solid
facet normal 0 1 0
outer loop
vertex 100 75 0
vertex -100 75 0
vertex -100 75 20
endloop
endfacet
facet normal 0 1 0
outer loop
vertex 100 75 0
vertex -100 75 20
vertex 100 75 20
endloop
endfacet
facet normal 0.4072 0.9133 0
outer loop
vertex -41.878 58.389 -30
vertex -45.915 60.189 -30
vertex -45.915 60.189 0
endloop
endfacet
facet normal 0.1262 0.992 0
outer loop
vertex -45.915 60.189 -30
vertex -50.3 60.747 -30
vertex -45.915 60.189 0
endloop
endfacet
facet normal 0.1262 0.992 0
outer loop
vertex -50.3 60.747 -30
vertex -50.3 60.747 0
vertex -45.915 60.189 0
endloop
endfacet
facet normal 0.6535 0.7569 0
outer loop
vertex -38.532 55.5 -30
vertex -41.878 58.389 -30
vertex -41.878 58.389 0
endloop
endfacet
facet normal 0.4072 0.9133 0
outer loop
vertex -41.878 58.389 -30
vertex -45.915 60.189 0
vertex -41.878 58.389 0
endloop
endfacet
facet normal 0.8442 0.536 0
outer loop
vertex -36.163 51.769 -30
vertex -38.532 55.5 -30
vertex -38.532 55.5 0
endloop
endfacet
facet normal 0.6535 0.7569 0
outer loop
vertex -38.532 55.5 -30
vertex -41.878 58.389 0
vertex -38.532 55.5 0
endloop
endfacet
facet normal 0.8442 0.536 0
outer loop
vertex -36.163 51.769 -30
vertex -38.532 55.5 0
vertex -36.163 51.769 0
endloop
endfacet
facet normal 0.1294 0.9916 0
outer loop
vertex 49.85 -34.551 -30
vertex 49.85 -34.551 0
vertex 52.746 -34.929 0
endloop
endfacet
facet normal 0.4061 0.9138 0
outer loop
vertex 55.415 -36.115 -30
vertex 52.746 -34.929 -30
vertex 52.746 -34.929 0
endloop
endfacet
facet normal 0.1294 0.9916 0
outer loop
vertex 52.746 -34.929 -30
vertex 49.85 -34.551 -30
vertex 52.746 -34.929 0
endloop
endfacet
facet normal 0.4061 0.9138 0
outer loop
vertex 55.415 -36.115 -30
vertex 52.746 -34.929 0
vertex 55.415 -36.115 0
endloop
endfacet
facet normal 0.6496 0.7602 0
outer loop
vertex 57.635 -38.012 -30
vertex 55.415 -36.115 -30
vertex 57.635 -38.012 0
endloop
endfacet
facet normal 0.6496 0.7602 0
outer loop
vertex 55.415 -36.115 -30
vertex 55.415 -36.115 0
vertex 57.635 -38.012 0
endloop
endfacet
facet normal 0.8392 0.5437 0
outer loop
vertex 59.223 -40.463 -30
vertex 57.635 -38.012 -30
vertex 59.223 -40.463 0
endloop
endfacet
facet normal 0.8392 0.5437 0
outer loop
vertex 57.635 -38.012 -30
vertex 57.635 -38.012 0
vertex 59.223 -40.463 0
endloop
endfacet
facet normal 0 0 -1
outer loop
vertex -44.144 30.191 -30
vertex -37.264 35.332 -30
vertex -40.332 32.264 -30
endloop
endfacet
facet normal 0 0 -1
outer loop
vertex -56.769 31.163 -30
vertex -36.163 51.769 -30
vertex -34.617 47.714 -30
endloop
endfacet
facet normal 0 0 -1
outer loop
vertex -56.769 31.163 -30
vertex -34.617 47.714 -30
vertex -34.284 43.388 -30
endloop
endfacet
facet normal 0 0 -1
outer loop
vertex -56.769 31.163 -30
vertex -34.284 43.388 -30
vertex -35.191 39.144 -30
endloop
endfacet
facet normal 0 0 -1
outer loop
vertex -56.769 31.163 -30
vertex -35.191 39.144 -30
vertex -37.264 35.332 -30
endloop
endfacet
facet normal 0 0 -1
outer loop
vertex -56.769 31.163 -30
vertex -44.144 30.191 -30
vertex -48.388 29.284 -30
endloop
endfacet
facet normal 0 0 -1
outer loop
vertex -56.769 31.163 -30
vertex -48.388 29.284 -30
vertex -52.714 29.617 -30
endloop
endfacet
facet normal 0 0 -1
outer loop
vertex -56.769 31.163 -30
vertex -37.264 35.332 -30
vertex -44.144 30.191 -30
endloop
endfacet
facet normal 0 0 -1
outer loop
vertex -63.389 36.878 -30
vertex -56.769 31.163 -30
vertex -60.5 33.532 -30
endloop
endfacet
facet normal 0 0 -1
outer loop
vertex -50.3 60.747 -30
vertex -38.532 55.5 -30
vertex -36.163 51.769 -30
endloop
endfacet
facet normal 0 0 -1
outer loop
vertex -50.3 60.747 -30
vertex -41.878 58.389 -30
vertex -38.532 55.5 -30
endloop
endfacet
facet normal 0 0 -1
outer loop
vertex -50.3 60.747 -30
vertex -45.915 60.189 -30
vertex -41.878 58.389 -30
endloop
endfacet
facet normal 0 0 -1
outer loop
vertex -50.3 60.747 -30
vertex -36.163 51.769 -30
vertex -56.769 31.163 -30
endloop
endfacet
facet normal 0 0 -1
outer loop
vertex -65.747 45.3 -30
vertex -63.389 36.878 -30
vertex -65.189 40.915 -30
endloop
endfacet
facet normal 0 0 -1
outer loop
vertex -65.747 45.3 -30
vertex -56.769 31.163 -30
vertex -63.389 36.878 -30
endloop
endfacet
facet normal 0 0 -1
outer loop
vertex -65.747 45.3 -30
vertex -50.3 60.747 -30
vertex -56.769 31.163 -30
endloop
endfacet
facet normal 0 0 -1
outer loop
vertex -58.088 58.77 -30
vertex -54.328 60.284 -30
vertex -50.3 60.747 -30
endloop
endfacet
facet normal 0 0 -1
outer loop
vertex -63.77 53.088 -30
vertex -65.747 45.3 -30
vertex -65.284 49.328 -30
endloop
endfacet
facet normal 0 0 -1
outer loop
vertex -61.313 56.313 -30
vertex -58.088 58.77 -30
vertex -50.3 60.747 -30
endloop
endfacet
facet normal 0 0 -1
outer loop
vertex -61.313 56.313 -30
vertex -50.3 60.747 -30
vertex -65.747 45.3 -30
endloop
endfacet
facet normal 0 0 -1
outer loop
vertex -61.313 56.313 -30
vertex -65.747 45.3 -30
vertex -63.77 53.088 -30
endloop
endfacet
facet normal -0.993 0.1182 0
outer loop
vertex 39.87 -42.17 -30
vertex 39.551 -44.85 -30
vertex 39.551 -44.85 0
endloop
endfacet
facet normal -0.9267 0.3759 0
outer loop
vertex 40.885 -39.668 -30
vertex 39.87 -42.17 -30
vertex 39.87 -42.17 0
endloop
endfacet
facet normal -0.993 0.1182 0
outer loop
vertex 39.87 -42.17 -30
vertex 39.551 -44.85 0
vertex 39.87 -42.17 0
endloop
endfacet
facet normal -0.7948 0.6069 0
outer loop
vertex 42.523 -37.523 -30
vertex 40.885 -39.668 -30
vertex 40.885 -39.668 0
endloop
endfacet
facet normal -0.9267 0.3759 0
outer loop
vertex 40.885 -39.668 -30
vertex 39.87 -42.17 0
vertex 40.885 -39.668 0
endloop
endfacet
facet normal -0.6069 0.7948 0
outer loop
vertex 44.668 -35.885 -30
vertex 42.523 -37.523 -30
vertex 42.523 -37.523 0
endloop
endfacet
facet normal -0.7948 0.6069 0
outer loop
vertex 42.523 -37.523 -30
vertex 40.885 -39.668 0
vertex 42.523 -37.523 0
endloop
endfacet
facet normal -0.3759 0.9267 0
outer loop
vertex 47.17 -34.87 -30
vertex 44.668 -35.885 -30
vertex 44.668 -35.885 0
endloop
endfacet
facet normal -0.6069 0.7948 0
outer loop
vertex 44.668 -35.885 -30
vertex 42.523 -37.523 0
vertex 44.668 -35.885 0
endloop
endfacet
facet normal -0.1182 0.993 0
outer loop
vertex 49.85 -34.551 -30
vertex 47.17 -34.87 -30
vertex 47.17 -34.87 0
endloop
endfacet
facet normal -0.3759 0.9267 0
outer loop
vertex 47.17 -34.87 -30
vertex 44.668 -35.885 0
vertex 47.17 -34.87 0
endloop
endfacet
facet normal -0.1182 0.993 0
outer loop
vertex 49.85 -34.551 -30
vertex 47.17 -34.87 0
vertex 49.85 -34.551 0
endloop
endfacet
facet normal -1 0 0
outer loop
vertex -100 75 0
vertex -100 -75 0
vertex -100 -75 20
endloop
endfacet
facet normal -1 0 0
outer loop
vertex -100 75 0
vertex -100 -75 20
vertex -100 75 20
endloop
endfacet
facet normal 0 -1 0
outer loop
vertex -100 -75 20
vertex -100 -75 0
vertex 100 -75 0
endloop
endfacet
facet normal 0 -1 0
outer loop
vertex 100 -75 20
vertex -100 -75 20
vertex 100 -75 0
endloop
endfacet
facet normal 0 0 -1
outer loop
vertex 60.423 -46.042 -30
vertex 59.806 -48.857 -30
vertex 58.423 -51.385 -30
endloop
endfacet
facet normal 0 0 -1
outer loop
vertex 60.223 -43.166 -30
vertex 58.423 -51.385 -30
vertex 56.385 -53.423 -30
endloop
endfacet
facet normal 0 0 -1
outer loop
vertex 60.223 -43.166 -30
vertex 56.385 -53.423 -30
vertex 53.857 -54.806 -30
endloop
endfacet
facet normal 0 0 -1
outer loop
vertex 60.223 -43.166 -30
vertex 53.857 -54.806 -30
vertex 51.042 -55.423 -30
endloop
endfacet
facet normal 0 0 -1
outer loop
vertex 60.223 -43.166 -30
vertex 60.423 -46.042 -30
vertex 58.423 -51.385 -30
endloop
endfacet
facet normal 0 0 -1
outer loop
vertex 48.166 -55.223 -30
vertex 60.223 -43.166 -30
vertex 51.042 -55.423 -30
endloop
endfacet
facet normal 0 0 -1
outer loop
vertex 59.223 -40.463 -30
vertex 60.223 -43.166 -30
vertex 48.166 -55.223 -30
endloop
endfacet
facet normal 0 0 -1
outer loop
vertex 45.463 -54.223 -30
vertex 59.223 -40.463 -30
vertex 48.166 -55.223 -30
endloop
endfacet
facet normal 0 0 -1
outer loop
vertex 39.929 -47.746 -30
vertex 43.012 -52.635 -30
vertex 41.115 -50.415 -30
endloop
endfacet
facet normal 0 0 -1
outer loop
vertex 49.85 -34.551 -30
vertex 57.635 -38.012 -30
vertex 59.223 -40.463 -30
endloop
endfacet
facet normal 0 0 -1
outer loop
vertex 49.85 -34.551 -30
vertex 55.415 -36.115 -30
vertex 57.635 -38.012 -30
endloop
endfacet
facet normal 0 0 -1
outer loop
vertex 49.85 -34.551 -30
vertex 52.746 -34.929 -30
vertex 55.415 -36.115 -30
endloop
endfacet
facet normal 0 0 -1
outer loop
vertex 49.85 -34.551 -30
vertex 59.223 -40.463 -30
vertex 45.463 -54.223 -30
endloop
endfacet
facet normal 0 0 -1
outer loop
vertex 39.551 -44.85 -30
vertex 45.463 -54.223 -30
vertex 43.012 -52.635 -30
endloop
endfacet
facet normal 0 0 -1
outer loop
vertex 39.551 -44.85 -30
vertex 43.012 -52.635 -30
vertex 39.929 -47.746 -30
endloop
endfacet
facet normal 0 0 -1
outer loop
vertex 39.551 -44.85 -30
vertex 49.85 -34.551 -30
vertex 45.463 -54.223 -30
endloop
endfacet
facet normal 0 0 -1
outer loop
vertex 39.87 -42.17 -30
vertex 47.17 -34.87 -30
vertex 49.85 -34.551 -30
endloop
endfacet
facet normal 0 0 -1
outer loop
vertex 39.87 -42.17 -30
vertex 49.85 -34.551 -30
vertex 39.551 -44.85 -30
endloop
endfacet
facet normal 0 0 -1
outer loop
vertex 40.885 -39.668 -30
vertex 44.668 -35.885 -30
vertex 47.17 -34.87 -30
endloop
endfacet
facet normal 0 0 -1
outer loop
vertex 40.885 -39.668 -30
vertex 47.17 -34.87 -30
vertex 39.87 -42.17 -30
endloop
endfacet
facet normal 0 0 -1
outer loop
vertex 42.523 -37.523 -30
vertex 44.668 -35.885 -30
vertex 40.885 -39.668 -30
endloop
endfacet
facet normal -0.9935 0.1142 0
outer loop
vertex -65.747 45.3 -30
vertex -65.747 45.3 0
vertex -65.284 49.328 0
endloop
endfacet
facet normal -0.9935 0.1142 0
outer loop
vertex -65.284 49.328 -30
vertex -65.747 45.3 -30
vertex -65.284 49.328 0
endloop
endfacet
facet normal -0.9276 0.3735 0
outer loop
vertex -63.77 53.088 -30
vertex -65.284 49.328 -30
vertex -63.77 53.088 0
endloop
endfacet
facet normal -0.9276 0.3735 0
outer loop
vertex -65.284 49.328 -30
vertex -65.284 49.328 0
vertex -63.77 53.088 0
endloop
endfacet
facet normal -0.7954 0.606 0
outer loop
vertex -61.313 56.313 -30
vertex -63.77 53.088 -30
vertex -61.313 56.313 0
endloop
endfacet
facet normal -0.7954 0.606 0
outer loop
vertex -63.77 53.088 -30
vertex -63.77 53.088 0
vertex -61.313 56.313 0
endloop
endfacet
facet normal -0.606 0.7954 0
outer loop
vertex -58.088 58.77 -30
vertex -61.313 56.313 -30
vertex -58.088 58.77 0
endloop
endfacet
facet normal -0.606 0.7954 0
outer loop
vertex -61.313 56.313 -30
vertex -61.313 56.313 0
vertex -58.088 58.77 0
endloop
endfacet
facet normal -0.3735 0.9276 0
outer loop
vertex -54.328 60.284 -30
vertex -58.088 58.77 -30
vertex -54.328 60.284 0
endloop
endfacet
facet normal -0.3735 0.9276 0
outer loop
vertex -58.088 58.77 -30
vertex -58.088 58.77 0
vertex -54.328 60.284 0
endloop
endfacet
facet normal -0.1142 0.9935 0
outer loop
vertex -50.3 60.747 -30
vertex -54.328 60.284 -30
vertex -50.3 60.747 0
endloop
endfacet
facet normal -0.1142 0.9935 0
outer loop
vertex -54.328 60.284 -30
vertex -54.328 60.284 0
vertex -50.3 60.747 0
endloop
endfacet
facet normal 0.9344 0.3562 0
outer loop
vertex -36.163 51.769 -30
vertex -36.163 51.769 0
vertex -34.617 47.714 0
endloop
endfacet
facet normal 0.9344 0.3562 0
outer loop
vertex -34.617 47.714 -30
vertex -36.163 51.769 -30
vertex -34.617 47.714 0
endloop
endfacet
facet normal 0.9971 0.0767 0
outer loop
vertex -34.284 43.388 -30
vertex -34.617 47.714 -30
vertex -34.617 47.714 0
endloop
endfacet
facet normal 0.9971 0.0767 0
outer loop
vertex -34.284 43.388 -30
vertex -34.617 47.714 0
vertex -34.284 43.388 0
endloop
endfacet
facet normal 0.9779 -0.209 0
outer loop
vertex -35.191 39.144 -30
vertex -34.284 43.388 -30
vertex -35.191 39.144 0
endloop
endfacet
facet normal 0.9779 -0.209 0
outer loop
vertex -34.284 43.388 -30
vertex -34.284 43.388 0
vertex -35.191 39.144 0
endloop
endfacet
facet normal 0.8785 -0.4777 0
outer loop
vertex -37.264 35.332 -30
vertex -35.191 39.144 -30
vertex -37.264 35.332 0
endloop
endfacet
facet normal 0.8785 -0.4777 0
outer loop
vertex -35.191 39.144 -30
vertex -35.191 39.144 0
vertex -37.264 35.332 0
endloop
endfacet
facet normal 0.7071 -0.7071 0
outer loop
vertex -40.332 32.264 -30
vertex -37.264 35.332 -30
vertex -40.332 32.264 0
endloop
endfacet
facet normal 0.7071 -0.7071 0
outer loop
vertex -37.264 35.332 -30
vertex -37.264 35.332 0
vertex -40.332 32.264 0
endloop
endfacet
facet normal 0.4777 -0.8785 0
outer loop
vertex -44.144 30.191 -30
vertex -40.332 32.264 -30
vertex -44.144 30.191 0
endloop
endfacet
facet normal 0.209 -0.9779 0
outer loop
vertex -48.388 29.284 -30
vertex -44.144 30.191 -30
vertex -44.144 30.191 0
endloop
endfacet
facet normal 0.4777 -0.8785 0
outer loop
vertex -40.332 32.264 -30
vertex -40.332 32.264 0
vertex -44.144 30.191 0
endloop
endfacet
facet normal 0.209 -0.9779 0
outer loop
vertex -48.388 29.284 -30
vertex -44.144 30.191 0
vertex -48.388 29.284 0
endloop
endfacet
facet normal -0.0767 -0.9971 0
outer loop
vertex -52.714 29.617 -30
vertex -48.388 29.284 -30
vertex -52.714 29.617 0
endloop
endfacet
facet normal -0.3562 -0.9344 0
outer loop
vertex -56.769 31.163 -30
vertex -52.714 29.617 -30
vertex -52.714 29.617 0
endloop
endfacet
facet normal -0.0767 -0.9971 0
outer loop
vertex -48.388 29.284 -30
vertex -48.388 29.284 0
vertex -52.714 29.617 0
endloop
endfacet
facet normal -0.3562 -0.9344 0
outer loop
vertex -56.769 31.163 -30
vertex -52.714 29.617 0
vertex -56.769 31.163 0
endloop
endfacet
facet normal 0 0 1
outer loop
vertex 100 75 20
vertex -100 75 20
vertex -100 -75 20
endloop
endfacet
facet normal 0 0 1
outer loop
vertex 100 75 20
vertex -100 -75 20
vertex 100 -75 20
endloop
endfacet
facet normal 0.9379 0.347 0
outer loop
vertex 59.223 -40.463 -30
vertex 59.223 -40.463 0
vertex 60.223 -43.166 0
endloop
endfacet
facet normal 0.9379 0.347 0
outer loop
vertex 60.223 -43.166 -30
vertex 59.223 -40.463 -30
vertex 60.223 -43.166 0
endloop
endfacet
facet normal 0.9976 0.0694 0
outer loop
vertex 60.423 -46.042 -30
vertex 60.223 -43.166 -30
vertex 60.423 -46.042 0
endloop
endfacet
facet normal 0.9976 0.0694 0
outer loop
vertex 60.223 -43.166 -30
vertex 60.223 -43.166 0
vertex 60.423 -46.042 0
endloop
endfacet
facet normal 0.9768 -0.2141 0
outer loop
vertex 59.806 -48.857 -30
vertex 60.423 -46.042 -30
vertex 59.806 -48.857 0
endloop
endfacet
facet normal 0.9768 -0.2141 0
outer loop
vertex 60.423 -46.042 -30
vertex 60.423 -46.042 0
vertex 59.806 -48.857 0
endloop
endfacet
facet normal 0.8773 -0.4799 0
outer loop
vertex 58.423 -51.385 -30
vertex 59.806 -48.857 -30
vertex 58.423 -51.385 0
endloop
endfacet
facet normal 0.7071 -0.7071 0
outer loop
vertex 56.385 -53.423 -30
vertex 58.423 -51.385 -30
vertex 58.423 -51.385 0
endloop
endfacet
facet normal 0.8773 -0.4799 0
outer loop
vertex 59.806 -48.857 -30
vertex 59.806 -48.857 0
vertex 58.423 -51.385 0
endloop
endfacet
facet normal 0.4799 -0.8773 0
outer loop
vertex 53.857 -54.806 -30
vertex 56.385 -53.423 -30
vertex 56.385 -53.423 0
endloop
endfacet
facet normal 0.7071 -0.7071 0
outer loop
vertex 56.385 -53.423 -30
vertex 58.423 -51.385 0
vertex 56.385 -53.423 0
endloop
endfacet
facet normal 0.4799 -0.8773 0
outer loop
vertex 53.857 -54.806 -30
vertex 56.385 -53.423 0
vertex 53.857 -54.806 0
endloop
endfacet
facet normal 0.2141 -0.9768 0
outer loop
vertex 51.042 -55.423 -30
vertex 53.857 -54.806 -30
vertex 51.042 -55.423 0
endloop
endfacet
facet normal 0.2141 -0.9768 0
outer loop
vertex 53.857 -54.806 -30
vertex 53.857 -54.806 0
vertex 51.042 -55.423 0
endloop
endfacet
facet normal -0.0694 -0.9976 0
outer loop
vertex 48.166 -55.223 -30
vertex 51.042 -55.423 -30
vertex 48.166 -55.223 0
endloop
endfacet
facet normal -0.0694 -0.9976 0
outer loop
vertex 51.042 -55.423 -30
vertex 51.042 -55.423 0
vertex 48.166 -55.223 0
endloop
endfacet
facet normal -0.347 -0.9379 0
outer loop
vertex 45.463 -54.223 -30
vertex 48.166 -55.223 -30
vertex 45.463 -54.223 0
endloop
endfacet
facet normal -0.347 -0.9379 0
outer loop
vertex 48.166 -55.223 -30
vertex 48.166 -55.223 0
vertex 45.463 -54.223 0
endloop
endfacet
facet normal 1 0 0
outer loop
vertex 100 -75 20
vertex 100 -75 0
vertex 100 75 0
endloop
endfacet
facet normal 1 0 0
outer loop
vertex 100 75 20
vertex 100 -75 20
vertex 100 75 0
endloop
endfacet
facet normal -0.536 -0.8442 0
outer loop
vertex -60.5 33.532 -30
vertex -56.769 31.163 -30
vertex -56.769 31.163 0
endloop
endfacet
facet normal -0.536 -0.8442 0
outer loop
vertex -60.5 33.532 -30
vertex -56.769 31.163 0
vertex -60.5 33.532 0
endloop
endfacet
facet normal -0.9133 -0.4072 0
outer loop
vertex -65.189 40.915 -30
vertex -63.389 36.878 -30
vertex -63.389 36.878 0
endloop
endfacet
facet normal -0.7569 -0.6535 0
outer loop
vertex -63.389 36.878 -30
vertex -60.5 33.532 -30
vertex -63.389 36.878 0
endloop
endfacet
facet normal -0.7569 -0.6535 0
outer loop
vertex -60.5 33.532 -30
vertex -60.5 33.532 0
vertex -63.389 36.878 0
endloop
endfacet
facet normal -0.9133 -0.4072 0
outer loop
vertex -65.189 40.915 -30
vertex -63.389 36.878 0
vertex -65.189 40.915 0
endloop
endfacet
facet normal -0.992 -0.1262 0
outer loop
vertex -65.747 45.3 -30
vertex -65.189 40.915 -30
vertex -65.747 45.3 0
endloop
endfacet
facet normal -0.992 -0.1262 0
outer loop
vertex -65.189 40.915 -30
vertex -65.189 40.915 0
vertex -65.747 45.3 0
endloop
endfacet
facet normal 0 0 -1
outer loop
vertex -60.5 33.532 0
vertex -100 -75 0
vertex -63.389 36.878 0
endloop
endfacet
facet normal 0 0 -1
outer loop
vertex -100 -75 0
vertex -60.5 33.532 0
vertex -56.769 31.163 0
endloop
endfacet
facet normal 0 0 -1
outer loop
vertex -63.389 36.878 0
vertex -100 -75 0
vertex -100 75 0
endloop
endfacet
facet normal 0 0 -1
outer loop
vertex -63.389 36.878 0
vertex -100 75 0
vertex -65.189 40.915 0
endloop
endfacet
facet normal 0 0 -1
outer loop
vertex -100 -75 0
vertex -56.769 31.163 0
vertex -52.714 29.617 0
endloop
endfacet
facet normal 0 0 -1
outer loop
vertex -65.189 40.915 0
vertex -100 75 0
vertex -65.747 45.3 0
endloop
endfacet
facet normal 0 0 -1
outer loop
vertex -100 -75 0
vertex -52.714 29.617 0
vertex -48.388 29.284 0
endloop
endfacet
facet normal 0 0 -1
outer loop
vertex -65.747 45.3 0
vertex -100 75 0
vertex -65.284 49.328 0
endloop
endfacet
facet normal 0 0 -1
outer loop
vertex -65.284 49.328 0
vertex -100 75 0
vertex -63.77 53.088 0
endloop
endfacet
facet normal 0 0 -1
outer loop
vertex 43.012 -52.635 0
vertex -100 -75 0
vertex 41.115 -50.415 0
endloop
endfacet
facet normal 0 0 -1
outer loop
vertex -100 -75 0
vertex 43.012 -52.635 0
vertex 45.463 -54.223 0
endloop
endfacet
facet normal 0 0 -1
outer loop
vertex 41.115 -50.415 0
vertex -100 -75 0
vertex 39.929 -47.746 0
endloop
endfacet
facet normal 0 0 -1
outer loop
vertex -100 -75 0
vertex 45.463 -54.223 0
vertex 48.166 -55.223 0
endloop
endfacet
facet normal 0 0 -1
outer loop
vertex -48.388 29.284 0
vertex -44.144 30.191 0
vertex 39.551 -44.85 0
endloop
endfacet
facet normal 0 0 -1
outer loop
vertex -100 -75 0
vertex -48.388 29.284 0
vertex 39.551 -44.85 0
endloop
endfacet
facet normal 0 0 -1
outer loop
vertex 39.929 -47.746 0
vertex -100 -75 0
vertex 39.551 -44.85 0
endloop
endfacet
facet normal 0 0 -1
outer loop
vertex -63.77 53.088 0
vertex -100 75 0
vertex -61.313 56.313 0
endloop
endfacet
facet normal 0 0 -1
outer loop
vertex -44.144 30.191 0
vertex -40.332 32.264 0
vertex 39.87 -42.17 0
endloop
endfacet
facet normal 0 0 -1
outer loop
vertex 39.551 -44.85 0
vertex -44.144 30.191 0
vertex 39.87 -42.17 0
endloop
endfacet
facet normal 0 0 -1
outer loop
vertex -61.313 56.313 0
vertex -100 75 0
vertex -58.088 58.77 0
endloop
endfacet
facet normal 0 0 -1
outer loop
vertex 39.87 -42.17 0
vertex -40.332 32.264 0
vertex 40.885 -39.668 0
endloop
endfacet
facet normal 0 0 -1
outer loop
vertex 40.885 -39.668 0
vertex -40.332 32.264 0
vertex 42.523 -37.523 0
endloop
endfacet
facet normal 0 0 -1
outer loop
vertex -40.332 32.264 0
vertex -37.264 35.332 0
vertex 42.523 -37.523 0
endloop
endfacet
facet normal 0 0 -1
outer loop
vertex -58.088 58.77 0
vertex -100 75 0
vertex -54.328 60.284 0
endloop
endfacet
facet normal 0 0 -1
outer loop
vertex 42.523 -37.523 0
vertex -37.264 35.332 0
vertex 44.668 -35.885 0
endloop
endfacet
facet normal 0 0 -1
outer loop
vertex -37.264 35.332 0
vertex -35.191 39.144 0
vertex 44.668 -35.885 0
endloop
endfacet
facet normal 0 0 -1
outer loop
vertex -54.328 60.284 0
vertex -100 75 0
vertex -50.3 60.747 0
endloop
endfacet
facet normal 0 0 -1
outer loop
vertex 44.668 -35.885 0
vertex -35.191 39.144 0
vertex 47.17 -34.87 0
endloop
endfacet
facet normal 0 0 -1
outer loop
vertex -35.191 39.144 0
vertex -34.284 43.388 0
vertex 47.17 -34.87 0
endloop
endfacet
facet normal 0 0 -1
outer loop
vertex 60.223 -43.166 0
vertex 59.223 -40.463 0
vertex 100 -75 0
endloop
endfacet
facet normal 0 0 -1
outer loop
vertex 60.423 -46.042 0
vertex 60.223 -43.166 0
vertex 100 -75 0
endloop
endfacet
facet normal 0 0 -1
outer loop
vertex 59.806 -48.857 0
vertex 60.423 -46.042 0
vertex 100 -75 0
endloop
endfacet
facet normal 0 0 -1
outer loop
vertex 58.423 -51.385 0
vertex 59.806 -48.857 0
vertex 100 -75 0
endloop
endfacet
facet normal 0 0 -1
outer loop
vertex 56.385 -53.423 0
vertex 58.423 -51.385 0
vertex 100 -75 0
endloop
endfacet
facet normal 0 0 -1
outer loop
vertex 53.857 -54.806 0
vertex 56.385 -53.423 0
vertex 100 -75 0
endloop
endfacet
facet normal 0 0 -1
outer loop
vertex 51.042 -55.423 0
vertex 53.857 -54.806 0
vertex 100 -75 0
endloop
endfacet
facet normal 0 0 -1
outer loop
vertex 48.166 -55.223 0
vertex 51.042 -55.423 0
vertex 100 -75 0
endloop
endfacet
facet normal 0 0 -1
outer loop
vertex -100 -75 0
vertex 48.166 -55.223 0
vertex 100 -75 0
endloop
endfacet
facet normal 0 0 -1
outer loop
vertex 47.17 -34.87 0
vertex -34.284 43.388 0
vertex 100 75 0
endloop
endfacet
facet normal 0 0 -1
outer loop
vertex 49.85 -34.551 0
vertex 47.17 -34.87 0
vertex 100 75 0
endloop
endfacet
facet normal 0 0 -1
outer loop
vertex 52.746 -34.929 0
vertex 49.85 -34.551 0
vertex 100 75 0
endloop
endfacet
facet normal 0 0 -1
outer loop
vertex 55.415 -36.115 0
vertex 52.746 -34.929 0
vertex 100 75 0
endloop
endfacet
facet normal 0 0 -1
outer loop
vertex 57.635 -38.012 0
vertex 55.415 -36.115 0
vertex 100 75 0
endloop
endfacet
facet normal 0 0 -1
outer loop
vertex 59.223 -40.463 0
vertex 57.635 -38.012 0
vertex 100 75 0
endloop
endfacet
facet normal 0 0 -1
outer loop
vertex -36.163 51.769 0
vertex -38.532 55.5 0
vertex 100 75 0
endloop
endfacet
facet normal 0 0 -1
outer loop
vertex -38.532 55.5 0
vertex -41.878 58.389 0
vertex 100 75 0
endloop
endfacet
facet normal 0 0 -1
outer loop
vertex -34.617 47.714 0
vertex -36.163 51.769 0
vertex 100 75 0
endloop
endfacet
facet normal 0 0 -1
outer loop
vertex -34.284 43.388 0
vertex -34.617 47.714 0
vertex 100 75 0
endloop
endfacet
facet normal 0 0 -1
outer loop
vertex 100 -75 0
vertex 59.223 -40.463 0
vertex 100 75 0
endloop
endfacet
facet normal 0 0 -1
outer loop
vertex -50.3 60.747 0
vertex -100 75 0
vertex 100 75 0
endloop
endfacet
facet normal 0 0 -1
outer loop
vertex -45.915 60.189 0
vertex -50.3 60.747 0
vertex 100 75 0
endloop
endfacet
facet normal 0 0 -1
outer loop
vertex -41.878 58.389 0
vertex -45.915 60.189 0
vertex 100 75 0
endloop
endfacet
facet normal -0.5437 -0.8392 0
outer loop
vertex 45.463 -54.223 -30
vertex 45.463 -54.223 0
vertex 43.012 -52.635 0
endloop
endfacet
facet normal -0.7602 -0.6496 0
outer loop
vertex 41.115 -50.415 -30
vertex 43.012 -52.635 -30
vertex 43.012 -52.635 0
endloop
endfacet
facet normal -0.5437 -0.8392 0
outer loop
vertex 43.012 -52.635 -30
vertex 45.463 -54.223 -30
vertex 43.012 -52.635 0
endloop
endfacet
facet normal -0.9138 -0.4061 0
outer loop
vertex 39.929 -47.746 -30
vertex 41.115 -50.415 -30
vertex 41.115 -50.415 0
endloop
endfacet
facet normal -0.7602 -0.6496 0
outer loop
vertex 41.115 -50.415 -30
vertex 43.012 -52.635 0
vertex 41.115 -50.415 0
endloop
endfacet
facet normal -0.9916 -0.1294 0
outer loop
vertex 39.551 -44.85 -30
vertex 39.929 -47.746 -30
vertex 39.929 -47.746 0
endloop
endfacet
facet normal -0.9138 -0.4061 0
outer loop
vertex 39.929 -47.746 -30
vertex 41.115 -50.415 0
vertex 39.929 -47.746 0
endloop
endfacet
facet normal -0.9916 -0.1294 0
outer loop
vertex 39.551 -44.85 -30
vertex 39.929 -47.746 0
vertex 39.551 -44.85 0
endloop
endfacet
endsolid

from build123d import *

# Parameters (mm, degrees)
SKETCH1_W           = 200
SKETCH1_H           = 150
BOSS_EXTRUDE1_DEPTH = 20
MIN_2_R             = 10.15
MIN_2_R_2           = 15.15
BOSS_EXTRUDE3_DEPTH = 30
MAX_LENTGH_R        = 10.15
MAX_LENTGH_R_2      = 15.15
BOSS_EXTRUDE4_DEPTH = 30
MAX_WIDTH_R         = 10.15
MAX_WIDTH_R_2       = 15.15
BOSS_EXTRUDE5_DEPTH = 30
MAX_2_R             = 10.15
MAX_2_R_2           = 15.15
BOSS_EXTRUDE6_DEPTH = 30


with BuildPart() as part:
    # Sketch1 → Boss-Extrude1 (new body)
    with BuildSketch(Plane.XY):
        Rectangle(SKETCH1_W, SKETCH1_H)
    extrude(amount=BOSS_EXTRUDE1_DEPTH)

    # min 2 → Boss-Extrude3 (add)
    with BuildSketch(Plane(origin=(0, 0, 0), x_dir=(-1, 0, 0), z_dir=(0, 0, -1))):
        with Locations((-50.3, -45.3)):
            Circle(MIN_2_R)
        with Locations((49.4, 44.4)):
            Circle(MIN_2_R_2)
    extrude(amount=BOSS_EXTRUDE3_DEPTH)

    # max - lentgh → Boss-Extrude4 (add)
    with BuildSketch(Plane(origin=(0, 0, 0), x_dir=(-1, 0, 0), z_dir=(0, 0, -1))):
        with Locations((-50, -44.7)):
            Circle(MAX_LENTGH_R)
        with Locations((50, 45.6)):
            Circle(MAX_LENTGH_R_2)
    extrude(amount=BOSS_EXTRUDE4_DEPTH)

    # max - width → Boss-Extrude5 (add)
    with BuildSketch(Plane(origin=(0, 0, 0), x_dir=(-1, 0, 0), z_dir=(0, 0, -1))):
        with Locations((-49.7, -45)):
            Circle(MAX_WIDTH_R)
        with Locations((50.6, 45)):
            Circle(MAX_WIDTH_R_2)
    extrude(amount=BOSS_EXTRUDE5_DEPTH)

    # max 2 → Boss-Extrude6 (add)
    with BuildSketch(Plane(origin=(0, 0, 0), x_dir=(-1, 0, 0), z_dir=(0, 0, -1))):
        with Locations((-49.7, -44.7)):
            Circle(MAX_2_R)
        with Locations((50.6, 45.6)):
            Circle(MAX_2_R_2)
    extrude(amount=BOSS_EXTRUDE6_DEPTH)


solid = part.part
